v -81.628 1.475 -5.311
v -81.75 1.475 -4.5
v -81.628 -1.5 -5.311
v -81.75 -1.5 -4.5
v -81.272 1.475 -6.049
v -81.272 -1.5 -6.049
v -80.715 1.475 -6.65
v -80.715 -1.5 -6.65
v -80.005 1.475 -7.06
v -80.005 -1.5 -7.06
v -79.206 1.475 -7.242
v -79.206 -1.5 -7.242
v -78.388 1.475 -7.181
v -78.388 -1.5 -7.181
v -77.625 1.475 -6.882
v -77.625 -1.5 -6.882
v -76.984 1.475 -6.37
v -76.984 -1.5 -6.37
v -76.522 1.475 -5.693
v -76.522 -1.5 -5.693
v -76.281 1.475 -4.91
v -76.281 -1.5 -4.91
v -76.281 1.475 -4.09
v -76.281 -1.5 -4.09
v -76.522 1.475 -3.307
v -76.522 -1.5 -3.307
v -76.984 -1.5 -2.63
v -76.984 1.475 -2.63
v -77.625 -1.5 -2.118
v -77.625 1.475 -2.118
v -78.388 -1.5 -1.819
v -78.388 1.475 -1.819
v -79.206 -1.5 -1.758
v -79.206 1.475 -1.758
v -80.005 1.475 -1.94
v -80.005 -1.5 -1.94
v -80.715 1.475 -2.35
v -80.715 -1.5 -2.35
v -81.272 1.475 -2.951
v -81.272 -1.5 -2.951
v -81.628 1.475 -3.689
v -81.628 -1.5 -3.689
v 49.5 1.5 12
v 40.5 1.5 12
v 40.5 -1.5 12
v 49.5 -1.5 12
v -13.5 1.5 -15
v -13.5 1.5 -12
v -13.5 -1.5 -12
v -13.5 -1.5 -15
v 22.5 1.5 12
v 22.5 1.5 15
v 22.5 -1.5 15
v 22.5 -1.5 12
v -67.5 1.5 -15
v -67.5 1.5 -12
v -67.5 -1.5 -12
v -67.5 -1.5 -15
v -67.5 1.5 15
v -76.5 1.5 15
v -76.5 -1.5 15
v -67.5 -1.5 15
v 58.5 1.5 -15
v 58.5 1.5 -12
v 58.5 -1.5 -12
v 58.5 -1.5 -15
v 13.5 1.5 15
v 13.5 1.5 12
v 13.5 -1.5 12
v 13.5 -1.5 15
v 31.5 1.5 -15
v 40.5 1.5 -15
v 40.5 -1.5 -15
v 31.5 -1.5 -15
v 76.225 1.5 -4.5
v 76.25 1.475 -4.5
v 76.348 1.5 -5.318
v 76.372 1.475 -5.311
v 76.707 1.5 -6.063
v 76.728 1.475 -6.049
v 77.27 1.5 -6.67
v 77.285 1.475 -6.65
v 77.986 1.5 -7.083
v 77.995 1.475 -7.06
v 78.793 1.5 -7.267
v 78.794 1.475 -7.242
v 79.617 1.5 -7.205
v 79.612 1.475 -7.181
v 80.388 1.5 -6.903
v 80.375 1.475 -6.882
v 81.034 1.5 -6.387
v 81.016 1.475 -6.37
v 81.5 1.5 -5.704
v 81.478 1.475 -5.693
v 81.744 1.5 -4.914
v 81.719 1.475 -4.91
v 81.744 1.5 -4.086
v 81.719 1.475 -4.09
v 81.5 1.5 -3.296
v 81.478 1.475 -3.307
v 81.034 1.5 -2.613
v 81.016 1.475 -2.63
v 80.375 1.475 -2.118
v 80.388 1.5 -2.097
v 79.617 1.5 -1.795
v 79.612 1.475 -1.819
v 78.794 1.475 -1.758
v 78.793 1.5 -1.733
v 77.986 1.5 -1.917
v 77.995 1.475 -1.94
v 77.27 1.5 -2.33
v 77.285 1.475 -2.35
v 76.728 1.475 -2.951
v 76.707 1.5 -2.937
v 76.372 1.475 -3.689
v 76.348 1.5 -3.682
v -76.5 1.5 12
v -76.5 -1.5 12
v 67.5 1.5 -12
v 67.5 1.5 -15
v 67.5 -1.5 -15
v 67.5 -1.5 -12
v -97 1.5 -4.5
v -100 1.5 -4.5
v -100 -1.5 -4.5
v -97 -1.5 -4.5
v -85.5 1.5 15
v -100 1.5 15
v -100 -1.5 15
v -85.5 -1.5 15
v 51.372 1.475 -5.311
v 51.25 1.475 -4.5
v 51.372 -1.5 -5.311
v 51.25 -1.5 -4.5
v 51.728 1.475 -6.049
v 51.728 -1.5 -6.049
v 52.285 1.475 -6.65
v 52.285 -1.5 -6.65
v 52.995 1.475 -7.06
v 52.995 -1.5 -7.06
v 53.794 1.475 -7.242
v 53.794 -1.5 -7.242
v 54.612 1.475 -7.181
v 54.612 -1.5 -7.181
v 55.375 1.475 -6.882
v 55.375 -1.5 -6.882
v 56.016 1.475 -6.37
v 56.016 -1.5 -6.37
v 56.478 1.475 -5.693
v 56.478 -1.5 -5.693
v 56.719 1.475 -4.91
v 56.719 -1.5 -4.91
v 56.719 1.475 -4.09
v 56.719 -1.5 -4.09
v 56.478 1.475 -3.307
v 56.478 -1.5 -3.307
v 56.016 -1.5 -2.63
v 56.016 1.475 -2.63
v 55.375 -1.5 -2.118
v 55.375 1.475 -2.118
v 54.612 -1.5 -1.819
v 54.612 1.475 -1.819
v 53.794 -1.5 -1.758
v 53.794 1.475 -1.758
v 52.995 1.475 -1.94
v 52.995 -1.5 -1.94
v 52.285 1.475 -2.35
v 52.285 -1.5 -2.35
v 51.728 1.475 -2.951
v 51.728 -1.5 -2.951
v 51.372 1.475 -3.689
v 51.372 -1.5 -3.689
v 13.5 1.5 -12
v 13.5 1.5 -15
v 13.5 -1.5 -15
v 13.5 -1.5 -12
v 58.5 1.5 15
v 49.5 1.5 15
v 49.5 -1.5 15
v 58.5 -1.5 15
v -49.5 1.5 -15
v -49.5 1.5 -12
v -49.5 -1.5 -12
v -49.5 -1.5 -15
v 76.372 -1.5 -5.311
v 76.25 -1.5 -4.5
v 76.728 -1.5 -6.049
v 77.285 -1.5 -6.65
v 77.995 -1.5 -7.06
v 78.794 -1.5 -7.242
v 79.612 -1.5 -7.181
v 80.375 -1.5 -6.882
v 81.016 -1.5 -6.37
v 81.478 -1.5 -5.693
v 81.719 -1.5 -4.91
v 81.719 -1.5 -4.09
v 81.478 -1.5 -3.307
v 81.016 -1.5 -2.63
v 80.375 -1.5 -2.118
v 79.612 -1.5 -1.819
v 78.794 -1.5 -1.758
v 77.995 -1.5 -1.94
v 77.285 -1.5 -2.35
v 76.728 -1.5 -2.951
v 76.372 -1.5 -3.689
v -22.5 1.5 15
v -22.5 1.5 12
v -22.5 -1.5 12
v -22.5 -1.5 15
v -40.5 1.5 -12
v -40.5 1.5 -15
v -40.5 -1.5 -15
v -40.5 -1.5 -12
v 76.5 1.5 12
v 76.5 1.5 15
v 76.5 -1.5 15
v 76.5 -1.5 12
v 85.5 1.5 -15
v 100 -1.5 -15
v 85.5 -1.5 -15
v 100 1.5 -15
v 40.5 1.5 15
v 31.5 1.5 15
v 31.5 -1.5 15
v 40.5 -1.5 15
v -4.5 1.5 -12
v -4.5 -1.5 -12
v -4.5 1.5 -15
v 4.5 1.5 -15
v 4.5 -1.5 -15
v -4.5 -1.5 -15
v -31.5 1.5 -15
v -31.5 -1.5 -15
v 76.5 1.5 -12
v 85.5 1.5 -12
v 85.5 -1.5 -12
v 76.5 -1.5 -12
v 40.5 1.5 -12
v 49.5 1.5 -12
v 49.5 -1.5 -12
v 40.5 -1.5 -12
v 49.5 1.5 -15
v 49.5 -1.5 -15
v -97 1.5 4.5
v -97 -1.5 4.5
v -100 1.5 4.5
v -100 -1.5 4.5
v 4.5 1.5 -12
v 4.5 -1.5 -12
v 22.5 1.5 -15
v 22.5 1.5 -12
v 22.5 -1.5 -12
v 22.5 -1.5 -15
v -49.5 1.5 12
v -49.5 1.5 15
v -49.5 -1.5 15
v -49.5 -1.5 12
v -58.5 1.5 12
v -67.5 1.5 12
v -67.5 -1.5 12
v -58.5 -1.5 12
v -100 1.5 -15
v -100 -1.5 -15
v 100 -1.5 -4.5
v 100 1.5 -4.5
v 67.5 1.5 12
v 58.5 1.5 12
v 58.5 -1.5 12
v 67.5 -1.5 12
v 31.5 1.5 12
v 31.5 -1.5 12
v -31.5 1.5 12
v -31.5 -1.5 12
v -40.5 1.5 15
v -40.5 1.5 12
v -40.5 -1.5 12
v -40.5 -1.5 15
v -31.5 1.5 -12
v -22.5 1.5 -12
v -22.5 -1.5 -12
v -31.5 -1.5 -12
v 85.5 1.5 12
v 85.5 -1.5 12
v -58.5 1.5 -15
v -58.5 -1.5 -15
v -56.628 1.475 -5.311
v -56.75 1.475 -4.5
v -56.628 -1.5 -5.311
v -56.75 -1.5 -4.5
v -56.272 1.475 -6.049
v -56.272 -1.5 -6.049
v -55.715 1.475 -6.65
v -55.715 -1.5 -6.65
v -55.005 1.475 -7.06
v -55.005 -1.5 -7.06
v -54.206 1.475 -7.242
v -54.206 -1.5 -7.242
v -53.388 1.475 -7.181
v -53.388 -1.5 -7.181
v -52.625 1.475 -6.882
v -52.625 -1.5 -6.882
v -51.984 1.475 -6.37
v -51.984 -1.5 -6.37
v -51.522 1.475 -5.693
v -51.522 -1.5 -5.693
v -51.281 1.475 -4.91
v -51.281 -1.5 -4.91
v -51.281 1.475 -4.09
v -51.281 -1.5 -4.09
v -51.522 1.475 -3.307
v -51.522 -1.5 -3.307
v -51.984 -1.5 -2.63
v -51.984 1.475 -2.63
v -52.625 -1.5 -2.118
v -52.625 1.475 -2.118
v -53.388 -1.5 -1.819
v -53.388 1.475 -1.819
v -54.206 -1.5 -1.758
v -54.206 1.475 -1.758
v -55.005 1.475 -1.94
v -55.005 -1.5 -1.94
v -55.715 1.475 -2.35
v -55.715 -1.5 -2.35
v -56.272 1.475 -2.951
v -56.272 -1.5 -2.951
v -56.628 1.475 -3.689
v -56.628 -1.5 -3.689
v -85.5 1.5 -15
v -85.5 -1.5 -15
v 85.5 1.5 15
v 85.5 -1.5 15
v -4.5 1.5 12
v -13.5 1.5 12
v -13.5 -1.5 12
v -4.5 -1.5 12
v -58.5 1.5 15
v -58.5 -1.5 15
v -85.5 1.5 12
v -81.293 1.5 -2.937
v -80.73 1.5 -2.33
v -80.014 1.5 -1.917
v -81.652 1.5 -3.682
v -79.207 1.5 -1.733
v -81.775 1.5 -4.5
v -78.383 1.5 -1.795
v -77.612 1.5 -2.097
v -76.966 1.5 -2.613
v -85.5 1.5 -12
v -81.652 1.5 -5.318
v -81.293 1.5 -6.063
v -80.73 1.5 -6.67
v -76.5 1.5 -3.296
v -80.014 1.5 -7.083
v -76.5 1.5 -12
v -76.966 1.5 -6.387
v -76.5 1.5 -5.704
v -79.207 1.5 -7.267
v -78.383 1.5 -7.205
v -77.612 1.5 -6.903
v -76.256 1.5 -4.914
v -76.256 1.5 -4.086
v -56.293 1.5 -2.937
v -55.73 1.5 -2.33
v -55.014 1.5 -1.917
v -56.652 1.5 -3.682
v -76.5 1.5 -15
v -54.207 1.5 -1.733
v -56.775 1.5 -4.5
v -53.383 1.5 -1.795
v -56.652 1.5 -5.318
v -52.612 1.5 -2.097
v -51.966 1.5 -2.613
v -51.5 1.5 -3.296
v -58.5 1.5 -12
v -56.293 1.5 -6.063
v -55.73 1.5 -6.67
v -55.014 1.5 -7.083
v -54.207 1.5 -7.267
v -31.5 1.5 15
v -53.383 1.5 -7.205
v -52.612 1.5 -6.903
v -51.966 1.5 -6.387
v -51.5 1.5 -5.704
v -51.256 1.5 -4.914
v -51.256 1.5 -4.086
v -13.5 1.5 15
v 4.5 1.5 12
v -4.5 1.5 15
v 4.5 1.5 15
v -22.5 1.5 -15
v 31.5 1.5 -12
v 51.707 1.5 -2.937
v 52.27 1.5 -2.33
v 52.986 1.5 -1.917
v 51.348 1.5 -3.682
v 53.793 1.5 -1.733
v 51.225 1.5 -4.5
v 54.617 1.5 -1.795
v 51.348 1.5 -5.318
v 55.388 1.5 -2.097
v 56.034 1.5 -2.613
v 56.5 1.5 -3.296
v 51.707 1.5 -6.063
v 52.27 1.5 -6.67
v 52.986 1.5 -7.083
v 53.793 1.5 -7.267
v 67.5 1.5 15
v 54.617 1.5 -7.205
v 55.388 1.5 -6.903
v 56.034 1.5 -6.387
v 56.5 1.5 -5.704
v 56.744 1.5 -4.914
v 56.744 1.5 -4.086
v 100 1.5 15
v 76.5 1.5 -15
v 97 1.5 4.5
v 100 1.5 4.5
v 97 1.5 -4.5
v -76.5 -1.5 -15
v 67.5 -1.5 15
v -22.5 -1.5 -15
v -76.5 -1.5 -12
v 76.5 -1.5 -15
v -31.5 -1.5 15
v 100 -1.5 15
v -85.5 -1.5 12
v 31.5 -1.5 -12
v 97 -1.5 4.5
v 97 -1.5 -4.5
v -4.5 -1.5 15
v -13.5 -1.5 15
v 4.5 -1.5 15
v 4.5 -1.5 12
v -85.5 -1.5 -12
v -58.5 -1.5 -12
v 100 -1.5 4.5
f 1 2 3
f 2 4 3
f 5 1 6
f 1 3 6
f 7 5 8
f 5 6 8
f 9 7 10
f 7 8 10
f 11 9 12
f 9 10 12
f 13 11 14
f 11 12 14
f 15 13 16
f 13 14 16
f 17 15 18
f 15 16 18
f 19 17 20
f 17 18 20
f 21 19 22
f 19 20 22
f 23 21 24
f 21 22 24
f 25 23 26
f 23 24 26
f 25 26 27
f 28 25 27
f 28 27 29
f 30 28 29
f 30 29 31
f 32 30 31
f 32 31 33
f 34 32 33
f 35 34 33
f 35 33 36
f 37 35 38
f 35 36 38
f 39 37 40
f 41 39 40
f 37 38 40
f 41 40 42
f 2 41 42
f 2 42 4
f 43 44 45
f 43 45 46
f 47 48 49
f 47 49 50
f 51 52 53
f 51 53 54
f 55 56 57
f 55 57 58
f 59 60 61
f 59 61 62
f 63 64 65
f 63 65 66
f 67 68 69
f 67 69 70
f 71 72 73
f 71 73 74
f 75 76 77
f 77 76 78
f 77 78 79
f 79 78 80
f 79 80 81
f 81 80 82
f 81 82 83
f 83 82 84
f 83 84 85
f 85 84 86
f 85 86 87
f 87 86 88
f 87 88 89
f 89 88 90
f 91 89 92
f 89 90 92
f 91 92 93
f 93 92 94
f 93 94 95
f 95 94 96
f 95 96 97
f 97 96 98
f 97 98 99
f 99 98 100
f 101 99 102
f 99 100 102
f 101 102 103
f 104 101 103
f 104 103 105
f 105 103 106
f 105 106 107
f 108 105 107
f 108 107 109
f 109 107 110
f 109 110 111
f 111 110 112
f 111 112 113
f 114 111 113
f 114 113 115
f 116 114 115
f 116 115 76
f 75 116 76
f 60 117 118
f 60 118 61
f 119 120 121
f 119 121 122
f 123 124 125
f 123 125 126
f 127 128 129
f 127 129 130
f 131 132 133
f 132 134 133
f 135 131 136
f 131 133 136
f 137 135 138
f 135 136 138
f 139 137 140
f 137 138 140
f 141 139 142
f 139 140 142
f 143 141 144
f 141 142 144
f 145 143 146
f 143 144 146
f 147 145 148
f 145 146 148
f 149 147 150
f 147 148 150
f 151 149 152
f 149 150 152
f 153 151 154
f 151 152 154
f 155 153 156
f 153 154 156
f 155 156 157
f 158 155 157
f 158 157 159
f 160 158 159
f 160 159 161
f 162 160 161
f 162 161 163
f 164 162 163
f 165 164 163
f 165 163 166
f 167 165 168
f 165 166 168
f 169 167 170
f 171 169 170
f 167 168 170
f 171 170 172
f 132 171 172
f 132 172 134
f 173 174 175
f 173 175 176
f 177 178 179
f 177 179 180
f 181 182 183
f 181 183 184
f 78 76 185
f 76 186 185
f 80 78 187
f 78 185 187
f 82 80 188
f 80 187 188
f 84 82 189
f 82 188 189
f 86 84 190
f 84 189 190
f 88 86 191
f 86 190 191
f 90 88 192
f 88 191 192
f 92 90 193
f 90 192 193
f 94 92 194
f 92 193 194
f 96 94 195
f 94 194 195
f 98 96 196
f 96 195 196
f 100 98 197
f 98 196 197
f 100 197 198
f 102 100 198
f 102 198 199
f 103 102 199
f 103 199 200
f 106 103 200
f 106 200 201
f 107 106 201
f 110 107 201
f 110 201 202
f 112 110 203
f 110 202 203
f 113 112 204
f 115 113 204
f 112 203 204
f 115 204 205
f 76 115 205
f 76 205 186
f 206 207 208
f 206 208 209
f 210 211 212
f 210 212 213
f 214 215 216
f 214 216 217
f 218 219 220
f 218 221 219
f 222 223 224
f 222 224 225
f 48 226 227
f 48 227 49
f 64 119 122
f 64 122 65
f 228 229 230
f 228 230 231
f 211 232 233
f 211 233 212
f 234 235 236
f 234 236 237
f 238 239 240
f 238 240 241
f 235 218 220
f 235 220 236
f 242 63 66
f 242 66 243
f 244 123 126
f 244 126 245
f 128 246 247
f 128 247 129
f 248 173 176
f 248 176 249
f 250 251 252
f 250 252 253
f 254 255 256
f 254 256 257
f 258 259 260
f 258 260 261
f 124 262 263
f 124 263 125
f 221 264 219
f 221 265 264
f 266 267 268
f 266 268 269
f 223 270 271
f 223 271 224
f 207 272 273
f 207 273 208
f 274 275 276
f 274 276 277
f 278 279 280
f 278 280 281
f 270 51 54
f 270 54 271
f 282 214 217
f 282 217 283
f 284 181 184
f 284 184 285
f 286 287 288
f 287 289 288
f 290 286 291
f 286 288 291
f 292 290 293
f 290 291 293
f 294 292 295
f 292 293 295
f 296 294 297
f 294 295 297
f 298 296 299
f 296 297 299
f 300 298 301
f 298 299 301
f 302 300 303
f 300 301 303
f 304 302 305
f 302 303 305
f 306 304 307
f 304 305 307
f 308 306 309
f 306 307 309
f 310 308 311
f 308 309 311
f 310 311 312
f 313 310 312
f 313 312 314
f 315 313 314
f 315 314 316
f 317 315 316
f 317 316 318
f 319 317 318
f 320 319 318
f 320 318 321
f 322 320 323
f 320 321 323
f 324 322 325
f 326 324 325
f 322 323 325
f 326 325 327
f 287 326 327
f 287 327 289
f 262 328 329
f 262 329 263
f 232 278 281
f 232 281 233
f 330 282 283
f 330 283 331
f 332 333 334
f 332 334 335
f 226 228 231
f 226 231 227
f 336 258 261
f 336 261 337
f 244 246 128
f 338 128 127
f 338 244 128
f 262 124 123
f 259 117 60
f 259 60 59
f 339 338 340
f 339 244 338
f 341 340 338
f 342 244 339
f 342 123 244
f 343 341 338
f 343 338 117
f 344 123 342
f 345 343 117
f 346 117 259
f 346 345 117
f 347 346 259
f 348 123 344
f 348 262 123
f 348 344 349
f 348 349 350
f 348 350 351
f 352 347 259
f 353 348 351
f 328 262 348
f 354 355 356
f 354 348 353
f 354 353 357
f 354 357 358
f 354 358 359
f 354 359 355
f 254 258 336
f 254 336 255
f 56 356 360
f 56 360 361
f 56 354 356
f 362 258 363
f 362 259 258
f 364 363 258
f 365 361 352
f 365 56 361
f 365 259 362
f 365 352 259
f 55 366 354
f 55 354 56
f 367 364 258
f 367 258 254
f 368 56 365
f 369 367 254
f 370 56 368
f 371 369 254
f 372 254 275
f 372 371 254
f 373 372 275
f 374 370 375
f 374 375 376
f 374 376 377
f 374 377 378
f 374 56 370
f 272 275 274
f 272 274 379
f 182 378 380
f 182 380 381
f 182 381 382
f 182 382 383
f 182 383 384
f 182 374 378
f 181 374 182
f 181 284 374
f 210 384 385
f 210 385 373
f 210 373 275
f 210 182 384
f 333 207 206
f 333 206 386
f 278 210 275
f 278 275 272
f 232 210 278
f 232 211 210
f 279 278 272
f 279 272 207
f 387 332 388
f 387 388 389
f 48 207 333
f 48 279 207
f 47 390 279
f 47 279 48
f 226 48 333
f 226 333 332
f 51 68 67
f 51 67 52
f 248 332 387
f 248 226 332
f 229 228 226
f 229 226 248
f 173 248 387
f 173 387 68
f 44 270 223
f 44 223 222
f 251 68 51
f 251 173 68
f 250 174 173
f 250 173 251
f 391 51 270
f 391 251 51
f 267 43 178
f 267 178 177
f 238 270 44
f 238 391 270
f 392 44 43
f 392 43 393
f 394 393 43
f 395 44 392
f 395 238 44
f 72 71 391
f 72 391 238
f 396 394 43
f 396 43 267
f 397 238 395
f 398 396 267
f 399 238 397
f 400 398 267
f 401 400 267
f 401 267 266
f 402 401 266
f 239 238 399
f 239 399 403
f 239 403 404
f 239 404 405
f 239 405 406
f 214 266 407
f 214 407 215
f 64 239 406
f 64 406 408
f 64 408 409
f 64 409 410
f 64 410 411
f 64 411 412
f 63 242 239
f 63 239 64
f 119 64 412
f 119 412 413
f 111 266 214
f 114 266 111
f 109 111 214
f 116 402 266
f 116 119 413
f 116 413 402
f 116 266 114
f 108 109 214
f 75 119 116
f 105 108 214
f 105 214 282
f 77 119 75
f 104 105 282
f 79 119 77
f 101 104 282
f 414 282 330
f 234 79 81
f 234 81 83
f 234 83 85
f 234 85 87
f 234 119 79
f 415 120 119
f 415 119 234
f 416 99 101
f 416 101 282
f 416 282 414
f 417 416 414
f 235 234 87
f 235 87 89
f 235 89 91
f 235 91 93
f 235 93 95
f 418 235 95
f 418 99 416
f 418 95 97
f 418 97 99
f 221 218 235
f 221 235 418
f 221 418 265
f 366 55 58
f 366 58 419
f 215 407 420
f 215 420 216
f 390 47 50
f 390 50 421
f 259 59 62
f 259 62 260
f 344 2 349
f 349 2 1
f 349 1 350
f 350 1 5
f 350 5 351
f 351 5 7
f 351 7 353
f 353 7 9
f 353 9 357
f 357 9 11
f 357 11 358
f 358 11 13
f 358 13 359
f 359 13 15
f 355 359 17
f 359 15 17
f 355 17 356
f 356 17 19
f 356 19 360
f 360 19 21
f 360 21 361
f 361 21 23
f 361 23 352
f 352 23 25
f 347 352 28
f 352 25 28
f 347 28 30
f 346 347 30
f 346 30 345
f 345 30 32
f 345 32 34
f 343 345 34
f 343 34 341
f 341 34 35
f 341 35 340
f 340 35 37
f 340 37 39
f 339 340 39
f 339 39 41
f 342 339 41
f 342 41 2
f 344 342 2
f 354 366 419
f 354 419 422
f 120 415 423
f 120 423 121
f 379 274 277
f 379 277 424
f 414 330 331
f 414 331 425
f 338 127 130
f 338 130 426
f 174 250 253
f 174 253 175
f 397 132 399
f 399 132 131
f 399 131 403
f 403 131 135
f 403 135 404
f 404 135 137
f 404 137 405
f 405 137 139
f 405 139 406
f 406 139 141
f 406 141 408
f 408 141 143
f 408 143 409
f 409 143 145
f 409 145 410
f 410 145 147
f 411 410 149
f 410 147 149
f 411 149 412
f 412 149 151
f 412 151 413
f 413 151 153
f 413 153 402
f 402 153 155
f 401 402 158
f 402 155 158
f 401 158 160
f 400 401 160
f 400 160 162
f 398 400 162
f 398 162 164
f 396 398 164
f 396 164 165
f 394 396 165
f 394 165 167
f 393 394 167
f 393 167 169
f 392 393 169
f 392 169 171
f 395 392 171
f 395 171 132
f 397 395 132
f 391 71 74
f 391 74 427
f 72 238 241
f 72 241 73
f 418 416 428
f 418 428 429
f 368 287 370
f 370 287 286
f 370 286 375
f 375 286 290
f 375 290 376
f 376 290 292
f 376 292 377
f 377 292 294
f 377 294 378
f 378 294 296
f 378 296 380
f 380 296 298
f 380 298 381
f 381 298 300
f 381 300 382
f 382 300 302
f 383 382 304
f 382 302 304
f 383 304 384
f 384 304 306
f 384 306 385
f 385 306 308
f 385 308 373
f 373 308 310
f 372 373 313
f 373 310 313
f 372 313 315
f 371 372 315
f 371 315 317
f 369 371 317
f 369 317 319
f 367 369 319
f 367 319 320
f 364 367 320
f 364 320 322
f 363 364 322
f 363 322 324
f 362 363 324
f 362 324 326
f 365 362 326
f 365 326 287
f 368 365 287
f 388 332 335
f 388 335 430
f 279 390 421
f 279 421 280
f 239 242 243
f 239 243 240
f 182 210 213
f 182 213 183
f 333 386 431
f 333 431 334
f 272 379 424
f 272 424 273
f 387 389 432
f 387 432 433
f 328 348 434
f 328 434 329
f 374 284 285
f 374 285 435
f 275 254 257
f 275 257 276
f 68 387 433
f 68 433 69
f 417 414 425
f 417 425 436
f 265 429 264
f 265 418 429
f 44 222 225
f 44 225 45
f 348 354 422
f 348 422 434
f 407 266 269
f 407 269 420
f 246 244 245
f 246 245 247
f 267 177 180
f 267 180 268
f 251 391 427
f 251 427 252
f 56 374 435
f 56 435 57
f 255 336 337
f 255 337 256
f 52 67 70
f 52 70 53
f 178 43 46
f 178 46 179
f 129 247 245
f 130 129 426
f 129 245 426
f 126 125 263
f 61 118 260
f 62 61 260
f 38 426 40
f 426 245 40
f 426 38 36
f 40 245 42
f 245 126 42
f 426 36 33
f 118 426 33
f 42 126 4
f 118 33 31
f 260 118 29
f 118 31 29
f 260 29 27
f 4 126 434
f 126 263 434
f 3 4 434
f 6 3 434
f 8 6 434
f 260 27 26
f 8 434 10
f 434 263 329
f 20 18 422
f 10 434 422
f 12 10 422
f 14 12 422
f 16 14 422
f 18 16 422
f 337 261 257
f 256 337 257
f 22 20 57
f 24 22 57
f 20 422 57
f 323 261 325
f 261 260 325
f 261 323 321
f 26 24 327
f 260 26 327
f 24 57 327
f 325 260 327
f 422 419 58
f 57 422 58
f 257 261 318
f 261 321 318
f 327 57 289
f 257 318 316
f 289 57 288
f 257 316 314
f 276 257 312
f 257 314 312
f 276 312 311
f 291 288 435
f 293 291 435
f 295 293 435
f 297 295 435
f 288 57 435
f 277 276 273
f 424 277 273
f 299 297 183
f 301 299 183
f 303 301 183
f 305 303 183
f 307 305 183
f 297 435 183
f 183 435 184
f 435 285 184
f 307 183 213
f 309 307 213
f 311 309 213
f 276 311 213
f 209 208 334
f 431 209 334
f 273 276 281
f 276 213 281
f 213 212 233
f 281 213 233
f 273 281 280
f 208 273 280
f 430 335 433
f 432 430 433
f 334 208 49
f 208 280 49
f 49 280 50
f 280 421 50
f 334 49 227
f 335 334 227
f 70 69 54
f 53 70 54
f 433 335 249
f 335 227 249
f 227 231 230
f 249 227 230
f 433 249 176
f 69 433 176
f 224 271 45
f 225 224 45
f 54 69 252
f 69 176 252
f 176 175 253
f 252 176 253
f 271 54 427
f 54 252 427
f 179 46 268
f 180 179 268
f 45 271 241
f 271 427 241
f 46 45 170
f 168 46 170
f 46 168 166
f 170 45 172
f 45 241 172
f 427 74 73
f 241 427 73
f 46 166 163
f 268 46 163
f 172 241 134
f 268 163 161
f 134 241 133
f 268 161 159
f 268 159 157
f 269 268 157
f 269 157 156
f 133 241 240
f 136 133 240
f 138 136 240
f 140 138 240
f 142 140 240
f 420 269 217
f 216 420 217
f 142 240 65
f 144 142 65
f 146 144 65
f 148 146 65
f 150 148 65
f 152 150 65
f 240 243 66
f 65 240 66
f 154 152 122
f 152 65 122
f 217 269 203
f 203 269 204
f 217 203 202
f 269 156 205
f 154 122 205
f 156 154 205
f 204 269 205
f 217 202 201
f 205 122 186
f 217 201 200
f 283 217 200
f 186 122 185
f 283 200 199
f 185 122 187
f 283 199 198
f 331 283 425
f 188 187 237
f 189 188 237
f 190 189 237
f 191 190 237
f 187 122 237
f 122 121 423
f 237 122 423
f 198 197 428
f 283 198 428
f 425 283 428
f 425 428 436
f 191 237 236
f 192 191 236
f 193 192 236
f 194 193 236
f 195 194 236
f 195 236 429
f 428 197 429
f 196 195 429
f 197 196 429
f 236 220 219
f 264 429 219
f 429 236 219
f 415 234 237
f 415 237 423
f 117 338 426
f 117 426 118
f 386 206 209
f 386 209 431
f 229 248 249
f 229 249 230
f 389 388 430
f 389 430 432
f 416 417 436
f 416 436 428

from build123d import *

# Parameters (mm, degrees)
BOSS_EXTRUDE1_DEPTH            = 1.5
M5_CLEARANCE_HOLE1_D           = 5.5
M5_CLEARANCE_HOLE1_CSINK_D     = 5.55
M5_CLEARANCE_HOLE1_CSINK_ANGLE = 90


with BuildPart() as part:
    # Sketch1 → Boss-Extrude1 (new, symmetric)
    with BuildSketch(Plane(origin=(0, 0, 0), x_dir=(1, 0, 0), z_dir=(0, 1, 0))):
        Polygon((100, 15), (97, 15), (85.5, 15), (85.5, 12), (76.5, 12), (76.5, 15), (67.5, 15), (67.5, 12), (58.5, 12), (58.5, 15), (49.5, 15), (49.5, 12), (40.5, 12), (40.5, 15), (31.5, 15), (31.5, 12), (22.5, 12), (22.5, 15), (13.5, 15), (13.5, 12), (4.5, 12), (4.5, 15), (-4.5, 15), (-4.5, 12), (-13.5, 12), (-13.5, 15), (-22.5, 15), (-22.5, 12), (-31.5, 12), (-31.5, 15), (-40.5, 15), (-40.5, 12), (-49.5, 12), (-49.5, 15), (-58.5, 15), (-58.5, 12), (-67.5, 12), (-67.5, 15), (-76.5, 15), (-76.5, 12), (-85.5, 12), (-85.5, 15), (-97, 15), (-100, 15), (-100, 12), (-100, 4.5), (-97, 4.5), (-97, -4.5), (-100, -4.5), (-100, -12), (-100, -15), (-97, -15), (-85.5, -15), (-85.5, -12), (-76.5, -12), (-76.5, -15), (-67.5, -15), (-67.5, -12), (-58.5, -12), (-58.5, -15), (-49.5, -15), (-49.5, -12), (-40.5, -12), (-40.5, -15), (-31.5, -15), (-31.5, -12), (-22.5, -12), (-22.5, -15), (-13.5, -15), (-13.5, -12), (-4.5, -12), (-4.5, -15), (4.5, -15), (4.5, -12), (13.5, -12), (13.5, -15), (22.5, -15), (22.5, -12), (31.5, -12), (31.5, -15), (40.5, -15), (40.5, -12), (49.5, -12), (49.5, -15), (58.5, -15), (58.5, -12), (67.5, -12), (67.5, -15), (76.5, -15), (76.5, -12), (85.5, -12), (85.5, -15), (97, -15), (100, -15), (100, -12), (100, -4.5), (97, -4.5), (97, 4.5), (100, 4.5), (100, 12), align=None)
    extrude(amount=BOSS_EXTRUDE1_DEPTH, both=True)

    # M5 Clearance Hole1 (through all)
    with Locations(Plane(origin=(0, 1.5, 0), x_dir=(1, 0, 0), z_dir=(0, 1, 0))):
        with Locations((54, 4.5), (-79, 4.5), (-54, 4.5), (79, 4.5)):
            CounterSinkHole(M5_CLEARANCE_HOLE1_D / 2, M5_CLEARANCE_HOLE1_CSINK_D / 2, counter_sink_angle=M5_CLEARANCE_HOLE1_CSINK_ANGLE)


solid = part.part
